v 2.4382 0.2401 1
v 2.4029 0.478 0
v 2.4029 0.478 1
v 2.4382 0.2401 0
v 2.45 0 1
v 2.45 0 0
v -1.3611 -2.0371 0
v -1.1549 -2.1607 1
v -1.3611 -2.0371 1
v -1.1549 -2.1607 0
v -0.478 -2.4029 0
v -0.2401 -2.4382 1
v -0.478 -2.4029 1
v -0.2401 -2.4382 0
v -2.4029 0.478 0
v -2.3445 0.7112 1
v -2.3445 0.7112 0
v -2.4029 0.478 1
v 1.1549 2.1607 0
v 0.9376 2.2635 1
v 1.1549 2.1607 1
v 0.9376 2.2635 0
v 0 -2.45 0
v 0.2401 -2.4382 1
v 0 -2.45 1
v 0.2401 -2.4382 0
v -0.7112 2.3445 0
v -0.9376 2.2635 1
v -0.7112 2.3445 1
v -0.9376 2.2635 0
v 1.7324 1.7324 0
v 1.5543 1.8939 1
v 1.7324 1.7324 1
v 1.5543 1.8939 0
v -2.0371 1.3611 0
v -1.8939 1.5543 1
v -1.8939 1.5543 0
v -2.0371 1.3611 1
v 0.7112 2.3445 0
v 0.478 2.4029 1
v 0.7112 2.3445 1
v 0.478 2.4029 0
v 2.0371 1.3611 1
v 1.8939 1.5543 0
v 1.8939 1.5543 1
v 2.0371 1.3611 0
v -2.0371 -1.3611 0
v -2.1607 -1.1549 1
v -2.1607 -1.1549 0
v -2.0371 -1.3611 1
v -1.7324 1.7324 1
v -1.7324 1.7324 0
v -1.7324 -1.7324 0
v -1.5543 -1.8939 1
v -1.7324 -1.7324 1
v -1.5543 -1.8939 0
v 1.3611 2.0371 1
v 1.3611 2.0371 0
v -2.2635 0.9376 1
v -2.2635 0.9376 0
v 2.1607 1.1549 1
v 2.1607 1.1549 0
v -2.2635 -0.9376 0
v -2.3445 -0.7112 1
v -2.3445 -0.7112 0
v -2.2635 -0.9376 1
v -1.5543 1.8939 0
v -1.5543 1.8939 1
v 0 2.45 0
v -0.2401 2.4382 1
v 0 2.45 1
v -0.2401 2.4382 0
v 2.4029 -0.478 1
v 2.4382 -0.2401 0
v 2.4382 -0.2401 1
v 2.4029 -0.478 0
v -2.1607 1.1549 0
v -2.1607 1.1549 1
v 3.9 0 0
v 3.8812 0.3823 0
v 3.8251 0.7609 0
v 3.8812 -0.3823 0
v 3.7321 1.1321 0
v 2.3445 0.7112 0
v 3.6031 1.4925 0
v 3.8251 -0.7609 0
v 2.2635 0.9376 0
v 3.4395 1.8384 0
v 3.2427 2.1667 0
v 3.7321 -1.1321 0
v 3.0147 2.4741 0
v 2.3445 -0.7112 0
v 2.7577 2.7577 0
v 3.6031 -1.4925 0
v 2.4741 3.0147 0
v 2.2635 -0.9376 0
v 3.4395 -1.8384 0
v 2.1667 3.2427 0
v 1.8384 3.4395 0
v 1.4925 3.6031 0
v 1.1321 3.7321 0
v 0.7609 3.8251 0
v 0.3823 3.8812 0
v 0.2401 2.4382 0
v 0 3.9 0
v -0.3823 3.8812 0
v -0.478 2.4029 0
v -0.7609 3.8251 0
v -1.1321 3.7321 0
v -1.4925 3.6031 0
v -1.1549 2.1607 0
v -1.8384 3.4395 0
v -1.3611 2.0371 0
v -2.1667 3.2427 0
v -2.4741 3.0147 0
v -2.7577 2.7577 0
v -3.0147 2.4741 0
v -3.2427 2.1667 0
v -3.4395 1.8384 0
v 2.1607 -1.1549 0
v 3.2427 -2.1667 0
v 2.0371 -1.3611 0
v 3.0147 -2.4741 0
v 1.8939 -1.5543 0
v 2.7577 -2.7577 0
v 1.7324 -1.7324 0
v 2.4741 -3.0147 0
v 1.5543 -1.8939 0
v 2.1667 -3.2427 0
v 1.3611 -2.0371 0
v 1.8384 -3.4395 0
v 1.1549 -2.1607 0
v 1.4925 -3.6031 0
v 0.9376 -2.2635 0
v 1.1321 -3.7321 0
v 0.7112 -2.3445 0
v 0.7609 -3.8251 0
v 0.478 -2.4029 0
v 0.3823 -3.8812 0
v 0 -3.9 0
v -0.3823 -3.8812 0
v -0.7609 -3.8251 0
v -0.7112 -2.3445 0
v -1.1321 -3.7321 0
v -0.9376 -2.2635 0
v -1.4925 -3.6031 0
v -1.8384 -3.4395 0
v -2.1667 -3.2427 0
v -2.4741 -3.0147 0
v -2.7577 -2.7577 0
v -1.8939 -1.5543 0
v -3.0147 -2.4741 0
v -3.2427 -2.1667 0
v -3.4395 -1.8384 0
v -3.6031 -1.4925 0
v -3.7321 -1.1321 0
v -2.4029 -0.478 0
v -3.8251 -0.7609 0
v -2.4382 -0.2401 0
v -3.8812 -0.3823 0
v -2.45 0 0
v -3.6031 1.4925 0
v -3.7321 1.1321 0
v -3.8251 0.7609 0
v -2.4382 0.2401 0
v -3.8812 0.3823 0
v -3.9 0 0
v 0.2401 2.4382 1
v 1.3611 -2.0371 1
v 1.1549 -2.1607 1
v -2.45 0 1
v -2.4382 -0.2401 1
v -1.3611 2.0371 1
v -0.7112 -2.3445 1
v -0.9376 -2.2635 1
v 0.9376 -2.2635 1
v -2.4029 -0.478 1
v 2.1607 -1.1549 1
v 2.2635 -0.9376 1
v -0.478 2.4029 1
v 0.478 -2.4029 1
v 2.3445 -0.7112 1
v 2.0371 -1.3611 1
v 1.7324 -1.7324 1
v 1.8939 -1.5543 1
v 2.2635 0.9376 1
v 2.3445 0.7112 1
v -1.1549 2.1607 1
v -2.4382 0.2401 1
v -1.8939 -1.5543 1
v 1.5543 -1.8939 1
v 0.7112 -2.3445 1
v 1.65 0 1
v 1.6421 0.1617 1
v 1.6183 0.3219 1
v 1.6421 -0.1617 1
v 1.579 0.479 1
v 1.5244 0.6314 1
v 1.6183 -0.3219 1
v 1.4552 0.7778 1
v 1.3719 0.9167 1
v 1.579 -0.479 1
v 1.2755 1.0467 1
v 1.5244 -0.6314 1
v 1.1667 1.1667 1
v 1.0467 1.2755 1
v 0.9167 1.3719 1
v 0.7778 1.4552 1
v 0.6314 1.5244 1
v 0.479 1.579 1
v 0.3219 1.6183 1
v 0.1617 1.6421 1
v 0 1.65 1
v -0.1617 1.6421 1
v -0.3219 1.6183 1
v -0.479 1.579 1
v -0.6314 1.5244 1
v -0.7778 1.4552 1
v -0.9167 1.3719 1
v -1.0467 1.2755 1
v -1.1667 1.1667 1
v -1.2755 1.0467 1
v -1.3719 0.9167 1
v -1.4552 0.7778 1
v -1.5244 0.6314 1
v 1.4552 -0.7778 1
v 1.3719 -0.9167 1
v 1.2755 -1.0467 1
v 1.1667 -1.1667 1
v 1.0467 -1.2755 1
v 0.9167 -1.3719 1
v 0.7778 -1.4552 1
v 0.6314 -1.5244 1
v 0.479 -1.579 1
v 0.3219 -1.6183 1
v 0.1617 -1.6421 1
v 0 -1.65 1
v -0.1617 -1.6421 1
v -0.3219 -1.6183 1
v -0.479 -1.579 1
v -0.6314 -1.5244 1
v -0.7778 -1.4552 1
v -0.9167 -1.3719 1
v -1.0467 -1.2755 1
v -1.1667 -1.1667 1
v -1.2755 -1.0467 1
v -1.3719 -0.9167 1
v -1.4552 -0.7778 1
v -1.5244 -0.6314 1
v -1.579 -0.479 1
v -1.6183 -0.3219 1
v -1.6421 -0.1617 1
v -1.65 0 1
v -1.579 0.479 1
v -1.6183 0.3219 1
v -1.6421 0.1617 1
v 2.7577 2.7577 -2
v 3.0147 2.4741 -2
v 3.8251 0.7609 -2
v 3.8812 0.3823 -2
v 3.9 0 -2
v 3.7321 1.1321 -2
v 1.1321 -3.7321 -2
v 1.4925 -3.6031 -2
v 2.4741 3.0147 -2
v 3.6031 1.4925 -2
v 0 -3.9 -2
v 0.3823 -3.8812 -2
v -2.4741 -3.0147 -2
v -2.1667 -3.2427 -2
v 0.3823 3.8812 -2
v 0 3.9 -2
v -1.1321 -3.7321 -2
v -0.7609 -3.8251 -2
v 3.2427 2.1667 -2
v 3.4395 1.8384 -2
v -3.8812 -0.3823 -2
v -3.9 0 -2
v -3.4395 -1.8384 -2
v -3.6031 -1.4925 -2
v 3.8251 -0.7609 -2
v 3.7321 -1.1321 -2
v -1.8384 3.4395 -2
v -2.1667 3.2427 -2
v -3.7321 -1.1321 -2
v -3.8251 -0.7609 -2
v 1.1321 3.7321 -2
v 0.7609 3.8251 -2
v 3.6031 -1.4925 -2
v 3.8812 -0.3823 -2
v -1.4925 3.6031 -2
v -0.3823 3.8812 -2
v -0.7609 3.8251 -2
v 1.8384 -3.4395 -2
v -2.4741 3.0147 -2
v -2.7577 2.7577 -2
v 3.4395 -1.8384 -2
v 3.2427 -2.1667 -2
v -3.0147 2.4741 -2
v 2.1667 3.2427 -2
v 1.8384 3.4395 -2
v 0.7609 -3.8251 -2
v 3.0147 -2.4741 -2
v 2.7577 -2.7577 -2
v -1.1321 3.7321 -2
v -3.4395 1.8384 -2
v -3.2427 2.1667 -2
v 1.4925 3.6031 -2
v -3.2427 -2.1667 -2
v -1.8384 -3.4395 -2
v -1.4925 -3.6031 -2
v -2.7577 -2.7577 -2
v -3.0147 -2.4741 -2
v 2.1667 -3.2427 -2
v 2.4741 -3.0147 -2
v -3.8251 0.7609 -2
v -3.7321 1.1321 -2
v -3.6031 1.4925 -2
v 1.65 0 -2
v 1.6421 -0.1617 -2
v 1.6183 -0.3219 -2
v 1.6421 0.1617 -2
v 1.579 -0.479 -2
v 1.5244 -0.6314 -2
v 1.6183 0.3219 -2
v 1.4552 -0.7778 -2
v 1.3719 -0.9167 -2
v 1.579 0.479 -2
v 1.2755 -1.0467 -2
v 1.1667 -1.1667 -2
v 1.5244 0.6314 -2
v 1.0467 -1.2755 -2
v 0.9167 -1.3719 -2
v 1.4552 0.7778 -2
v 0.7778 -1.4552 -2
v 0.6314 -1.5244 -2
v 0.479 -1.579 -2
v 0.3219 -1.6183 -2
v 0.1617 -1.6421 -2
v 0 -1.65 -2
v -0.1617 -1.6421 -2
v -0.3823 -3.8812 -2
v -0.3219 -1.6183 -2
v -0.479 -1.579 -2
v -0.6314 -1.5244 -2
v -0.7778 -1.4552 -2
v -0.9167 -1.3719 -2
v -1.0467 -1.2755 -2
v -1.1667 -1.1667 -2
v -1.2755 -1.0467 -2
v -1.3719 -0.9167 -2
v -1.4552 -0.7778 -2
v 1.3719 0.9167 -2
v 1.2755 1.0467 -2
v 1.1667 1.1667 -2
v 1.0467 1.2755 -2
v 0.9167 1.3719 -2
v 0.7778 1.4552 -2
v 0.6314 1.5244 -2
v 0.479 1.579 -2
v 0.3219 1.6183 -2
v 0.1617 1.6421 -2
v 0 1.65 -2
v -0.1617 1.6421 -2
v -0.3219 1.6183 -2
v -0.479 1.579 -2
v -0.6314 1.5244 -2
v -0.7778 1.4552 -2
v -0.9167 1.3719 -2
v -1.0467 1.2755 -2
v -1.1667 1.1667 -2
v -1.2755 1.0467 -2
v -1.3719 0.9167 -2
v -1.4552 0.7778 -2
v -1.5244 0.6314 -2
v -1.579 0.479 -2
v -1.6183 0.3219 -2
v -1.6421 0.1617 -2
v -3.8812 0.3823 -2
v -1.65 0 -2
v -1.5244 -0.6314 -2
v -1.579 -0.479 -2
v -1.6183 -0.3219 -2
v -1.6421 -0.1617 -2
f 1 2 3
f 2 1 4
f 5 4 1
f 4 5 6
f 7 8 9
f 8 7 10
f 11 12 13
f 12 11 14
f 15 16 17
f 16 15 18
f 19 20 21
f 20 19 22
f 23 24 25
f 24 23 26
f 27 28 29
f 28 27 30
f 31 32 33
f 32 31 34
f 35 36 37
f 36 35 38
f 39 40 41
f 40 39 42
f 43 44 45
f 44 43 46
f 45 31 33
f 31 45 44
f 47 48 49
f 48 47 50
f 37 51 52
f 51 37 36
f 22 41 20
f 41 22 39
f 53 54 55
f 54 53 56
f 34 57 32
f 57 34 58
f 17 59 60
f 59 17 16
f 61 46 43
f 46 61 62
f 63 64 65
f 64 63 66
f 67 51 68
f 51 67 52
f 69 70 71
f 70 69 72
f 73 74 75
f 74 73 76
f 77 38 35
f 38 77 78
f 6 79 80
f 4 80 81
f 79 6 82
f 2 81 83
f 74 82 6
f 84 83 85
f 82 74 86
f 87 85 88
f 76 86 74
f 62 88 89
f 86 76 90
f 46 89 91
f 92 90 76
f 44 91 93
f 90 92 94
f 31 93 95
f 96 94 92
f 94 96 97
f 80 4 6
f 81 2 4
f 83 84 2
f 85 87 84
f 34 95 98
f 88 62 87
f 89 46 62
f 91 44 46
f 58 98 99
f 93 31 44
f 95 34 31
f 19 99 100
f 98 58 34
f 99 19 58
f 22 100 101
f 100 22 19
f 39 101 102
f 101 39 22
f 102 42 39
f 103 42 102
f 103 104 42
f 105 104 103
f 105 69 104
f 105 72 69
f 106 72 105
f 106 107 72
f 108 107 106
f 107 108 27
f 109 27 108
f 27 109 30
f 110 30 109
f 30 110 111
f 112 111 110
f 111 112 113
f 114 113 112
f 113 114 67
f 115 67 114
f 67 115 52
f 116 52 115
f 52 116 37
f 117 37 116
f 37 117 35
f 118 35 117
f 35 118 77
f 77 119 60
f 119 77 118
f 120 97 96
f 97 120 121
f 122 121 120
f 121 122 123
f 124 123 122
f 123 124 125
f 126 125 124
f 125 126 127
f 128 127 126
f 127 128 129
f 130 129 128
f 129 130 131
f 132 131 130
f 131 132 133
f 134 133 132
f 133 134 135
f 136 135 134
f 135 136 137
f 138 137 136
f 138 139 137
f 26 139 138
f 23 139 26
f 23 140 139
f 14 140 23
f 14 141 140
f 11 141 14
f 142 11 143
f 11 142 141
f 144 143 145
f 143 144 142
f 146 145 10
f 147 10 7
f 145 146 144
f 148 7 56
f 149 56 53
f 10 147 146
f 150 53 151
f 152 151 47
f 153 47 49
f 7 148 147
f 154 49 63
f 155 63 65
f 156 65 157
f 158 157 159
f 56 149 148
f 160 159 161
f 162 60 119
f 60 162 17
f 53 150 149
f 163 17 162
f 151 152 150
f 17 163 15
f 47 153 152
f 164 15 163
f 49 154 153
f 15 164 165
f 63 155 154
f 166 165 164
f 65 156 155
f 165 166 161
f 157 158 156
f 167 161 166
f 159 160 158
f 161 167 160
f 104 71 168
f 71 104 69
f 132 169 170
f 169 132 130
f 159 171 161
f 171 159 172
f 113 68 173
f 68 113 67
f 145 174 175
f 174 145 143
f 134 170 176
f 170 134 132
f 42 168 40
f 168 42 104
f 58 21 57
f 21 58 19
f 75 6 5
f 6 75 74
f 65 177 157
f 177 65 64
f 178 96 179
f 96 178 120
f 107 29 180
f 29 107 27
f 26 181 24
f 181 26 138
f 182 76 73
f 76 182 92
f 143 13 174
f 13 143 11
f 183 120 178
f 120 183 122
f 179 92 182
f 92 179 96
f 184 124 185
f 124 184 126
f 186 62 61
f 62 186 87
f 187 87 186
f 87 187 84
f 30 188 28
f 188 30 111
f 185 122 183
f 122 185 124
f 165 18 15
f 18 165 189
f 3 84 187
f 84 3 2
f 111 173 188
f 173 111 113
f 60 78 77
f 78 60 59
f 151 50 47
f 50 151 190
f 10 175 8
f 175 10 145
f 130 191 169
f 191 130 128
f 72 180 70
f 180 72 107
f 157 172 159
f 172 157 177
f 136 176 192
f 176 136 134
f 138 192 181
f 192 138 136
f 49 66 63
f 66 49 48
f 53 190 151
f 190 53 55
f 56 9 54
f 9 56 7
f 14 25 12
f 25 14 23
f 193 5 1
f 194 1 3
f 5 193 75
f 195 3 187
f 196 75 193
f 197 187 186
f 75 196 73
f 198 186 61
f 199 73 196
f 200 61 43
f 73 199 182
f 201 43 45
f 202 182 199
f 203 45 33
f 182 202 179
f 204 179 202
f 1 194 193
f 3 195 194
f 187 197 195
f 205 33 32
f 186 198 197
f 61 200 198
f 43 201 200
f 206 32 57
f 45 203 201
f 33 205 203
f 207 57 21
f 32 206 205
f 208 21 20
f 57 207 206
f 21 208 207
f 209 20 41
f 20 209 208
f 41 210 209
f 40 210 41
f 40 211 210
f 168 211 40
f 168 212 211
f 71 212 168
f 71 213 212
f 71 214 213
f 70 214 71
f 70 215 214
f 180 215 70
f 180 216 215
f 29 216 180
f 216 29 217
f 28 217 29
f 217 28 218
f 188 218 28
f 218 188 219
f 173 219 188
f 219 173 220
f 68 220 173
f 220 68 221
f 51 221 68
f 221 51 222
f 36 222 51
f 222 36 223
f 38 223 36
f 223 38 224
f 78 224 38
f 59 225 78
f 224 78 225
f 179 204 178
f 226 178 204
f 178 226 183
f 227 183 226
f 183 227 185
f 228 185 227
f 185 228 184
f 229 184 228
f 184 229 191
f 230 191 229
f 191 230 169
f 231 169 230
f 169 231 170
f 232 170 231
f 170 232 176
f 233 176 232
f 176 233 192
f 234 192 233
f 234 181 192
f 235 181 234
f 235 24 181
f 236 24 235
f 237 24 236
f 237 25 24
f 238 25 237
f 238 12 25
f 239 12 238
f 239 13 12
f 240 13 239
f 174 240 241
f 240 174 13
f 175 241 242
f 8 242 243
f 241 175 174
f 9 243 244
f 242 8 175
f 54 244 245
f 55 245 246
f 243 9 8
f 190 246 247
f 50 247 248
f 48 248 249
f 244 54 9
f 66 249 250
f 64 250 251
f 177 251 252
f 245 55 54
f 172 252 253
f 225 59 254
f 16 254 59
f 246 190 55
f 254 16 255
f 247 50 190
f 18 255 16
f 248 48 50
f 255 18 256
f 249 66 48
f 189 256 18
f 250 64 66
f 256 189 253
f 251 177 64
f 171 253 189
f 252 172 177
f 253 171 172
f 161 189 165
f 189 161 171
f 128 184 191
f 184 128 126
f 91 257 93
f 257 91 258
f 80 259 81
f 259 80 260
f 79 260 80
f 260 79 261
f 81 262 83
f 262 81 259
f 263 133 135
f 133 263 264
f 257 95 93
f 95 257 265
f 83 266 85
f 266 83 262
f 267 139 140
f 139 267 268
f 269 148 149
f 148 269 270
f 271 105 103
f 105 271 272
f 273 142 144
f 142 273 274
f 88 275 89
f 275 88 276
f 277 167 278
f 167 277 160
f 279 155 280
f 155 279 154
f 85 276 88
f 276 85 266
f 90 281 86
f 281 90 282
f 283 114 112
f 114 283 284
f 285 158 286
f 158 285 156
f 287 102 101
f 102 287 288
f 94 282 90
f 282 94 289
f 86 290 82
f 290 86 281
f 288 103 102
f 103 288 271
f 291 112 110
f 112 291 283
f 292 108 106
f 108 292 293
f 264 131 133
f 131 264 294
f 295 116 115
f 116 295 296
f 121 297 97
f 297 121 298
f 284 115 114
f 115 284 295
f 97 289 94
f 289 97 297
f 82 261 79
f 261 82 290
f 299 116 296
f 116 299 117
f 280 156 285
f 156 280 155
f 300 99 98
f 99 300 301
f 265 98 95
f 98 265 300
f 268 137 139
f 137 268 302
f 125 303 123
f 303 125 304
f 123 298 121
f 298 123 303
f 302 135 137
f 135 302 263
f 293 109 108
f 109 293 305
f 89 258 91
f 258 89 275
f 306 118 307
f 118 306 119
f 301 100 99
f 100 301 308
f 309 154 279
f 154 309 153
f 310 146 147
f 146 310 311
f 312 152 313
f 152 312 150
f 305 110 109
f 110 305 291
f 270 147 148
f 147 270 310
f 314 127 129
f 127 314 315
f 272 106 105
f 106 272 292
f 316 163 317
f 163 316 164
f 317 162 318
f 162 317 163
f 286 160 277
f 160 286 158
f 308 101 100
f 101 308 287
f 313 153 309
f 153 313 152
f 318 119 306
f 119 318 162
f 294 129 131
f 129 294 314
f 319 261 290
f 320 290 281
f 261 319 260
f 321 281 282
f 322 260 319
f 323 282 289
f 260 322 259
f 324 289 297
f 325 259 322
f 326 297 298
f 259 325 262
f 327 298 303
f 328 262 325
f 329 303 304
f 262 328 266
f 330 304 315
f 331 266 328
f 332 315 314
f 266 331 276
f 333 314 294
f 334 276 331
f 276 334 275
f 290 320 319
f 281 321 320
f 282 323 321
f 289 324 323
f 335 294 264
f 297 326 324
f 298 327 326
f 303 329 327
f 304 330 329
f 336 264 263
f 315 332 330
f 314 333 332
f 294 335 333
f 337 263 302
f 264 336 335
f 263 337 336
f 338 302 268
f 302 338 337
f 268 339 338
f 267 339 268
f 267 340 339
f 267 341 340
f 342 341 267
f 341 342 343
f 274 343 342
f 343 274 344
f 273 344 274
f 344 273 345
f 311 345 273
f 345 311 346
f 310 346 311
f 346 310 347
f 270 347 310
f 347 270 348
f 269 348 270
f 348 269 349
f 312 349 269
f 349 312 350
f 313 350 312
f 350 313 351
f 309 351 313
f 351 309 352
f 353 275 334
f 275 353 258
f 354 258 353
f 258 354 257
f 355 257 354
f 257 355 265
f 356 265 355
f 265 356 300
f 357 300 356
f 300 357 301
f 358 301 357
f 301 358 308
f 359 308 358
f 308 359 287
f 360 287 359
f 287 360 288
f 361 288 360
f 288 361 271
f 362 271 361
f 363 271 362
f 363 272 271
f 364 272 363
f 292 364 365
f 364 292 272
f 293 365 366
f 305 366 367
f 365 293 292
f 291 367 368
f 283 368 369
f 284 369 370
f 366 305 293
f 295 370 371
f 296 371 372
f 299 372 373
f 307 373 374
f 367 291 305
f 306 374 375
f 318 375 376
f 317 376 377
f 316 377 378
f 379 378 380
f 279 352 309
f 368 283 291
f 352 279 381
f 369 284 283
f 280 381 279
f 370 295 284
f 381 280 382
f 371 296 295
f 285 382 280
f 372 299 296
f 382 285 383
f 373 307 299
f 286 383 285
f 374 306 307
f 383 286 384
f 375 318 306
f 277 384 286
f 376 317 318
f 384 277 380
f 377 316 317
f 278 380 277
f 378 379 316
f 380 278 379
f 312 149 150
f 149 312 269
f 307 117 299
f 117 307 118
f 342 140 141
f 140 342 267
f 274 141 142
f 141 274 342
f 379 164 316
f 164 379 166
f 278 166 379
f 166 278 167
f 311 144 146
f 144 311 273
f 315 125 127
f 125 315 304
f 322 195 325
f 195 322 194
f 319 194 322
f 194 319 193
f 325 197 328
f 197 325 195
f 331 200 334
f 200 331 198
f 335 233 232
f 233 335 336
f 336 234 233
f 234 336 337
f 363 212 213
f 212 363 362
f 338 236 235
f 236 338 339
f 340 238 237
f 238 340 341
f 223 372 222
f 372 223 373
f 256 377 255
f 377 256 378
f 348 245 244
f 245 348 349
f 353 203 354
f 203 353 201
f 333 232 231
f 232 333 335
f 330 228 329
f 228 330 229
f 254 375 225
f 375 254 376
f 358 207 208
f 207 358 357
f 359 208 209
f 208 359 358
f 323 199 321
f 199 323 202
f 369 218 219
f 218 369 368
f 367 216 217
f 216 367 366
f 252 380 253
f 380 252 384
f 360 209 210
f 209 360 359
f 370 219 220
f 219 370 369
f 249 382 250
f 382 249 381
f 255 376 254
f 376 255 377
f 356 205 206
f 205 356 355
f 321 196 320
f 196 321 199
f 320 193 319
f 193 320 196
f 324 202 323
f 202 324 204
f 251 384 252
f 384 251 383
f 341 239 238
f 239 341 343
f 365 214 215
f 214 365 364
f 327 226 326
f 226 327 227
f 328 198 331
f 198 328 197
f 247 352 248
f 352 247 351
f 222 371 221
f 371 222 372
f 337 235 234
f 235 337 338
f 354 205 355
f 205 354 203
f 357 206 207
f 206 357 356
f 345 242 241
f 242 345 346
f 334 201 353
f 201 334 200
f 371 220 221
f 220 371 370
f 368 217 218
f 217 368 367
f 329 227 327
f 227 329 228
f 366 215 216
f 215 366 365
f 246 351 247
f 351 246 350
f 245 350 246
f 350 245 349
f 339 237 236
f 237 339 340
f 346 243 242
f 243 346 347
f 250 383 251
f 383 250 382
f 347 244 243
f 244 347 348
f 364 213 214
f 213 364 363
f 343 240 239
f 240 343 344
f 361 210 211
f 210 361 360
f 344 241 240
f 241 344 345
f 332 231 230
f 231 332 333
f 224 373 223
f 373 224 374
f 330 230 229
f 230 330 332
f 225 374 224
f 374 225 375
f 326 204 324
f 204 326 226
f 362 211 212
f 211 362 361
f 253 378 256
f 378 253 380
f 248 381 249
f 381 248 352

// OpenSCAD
$fn=64;

module pin() {
    PIN_HEIGHT = 1.0;
    PIN_DIAMETER = 4.9;
    PIN_HOLE_DIAMETER = 3.3;
    BASE_HEIGHT = 2;
    BASE_DIAMETER = 7.8;

    difference() {
        union() {
            translate([0, 0, 0]) cylinder(d=PIN_DIAMETER, PIN_HEIGHT);
            translate([0, 0, -BASE_HEIGHT]) cylinder(d=BASE_DIAMETER, BASE_HEIGHT);
        }
        translate([0, 0, -25]) cylinder(d=PIN_HOLE_DIAMETER, 50);
    }
}

pin();
